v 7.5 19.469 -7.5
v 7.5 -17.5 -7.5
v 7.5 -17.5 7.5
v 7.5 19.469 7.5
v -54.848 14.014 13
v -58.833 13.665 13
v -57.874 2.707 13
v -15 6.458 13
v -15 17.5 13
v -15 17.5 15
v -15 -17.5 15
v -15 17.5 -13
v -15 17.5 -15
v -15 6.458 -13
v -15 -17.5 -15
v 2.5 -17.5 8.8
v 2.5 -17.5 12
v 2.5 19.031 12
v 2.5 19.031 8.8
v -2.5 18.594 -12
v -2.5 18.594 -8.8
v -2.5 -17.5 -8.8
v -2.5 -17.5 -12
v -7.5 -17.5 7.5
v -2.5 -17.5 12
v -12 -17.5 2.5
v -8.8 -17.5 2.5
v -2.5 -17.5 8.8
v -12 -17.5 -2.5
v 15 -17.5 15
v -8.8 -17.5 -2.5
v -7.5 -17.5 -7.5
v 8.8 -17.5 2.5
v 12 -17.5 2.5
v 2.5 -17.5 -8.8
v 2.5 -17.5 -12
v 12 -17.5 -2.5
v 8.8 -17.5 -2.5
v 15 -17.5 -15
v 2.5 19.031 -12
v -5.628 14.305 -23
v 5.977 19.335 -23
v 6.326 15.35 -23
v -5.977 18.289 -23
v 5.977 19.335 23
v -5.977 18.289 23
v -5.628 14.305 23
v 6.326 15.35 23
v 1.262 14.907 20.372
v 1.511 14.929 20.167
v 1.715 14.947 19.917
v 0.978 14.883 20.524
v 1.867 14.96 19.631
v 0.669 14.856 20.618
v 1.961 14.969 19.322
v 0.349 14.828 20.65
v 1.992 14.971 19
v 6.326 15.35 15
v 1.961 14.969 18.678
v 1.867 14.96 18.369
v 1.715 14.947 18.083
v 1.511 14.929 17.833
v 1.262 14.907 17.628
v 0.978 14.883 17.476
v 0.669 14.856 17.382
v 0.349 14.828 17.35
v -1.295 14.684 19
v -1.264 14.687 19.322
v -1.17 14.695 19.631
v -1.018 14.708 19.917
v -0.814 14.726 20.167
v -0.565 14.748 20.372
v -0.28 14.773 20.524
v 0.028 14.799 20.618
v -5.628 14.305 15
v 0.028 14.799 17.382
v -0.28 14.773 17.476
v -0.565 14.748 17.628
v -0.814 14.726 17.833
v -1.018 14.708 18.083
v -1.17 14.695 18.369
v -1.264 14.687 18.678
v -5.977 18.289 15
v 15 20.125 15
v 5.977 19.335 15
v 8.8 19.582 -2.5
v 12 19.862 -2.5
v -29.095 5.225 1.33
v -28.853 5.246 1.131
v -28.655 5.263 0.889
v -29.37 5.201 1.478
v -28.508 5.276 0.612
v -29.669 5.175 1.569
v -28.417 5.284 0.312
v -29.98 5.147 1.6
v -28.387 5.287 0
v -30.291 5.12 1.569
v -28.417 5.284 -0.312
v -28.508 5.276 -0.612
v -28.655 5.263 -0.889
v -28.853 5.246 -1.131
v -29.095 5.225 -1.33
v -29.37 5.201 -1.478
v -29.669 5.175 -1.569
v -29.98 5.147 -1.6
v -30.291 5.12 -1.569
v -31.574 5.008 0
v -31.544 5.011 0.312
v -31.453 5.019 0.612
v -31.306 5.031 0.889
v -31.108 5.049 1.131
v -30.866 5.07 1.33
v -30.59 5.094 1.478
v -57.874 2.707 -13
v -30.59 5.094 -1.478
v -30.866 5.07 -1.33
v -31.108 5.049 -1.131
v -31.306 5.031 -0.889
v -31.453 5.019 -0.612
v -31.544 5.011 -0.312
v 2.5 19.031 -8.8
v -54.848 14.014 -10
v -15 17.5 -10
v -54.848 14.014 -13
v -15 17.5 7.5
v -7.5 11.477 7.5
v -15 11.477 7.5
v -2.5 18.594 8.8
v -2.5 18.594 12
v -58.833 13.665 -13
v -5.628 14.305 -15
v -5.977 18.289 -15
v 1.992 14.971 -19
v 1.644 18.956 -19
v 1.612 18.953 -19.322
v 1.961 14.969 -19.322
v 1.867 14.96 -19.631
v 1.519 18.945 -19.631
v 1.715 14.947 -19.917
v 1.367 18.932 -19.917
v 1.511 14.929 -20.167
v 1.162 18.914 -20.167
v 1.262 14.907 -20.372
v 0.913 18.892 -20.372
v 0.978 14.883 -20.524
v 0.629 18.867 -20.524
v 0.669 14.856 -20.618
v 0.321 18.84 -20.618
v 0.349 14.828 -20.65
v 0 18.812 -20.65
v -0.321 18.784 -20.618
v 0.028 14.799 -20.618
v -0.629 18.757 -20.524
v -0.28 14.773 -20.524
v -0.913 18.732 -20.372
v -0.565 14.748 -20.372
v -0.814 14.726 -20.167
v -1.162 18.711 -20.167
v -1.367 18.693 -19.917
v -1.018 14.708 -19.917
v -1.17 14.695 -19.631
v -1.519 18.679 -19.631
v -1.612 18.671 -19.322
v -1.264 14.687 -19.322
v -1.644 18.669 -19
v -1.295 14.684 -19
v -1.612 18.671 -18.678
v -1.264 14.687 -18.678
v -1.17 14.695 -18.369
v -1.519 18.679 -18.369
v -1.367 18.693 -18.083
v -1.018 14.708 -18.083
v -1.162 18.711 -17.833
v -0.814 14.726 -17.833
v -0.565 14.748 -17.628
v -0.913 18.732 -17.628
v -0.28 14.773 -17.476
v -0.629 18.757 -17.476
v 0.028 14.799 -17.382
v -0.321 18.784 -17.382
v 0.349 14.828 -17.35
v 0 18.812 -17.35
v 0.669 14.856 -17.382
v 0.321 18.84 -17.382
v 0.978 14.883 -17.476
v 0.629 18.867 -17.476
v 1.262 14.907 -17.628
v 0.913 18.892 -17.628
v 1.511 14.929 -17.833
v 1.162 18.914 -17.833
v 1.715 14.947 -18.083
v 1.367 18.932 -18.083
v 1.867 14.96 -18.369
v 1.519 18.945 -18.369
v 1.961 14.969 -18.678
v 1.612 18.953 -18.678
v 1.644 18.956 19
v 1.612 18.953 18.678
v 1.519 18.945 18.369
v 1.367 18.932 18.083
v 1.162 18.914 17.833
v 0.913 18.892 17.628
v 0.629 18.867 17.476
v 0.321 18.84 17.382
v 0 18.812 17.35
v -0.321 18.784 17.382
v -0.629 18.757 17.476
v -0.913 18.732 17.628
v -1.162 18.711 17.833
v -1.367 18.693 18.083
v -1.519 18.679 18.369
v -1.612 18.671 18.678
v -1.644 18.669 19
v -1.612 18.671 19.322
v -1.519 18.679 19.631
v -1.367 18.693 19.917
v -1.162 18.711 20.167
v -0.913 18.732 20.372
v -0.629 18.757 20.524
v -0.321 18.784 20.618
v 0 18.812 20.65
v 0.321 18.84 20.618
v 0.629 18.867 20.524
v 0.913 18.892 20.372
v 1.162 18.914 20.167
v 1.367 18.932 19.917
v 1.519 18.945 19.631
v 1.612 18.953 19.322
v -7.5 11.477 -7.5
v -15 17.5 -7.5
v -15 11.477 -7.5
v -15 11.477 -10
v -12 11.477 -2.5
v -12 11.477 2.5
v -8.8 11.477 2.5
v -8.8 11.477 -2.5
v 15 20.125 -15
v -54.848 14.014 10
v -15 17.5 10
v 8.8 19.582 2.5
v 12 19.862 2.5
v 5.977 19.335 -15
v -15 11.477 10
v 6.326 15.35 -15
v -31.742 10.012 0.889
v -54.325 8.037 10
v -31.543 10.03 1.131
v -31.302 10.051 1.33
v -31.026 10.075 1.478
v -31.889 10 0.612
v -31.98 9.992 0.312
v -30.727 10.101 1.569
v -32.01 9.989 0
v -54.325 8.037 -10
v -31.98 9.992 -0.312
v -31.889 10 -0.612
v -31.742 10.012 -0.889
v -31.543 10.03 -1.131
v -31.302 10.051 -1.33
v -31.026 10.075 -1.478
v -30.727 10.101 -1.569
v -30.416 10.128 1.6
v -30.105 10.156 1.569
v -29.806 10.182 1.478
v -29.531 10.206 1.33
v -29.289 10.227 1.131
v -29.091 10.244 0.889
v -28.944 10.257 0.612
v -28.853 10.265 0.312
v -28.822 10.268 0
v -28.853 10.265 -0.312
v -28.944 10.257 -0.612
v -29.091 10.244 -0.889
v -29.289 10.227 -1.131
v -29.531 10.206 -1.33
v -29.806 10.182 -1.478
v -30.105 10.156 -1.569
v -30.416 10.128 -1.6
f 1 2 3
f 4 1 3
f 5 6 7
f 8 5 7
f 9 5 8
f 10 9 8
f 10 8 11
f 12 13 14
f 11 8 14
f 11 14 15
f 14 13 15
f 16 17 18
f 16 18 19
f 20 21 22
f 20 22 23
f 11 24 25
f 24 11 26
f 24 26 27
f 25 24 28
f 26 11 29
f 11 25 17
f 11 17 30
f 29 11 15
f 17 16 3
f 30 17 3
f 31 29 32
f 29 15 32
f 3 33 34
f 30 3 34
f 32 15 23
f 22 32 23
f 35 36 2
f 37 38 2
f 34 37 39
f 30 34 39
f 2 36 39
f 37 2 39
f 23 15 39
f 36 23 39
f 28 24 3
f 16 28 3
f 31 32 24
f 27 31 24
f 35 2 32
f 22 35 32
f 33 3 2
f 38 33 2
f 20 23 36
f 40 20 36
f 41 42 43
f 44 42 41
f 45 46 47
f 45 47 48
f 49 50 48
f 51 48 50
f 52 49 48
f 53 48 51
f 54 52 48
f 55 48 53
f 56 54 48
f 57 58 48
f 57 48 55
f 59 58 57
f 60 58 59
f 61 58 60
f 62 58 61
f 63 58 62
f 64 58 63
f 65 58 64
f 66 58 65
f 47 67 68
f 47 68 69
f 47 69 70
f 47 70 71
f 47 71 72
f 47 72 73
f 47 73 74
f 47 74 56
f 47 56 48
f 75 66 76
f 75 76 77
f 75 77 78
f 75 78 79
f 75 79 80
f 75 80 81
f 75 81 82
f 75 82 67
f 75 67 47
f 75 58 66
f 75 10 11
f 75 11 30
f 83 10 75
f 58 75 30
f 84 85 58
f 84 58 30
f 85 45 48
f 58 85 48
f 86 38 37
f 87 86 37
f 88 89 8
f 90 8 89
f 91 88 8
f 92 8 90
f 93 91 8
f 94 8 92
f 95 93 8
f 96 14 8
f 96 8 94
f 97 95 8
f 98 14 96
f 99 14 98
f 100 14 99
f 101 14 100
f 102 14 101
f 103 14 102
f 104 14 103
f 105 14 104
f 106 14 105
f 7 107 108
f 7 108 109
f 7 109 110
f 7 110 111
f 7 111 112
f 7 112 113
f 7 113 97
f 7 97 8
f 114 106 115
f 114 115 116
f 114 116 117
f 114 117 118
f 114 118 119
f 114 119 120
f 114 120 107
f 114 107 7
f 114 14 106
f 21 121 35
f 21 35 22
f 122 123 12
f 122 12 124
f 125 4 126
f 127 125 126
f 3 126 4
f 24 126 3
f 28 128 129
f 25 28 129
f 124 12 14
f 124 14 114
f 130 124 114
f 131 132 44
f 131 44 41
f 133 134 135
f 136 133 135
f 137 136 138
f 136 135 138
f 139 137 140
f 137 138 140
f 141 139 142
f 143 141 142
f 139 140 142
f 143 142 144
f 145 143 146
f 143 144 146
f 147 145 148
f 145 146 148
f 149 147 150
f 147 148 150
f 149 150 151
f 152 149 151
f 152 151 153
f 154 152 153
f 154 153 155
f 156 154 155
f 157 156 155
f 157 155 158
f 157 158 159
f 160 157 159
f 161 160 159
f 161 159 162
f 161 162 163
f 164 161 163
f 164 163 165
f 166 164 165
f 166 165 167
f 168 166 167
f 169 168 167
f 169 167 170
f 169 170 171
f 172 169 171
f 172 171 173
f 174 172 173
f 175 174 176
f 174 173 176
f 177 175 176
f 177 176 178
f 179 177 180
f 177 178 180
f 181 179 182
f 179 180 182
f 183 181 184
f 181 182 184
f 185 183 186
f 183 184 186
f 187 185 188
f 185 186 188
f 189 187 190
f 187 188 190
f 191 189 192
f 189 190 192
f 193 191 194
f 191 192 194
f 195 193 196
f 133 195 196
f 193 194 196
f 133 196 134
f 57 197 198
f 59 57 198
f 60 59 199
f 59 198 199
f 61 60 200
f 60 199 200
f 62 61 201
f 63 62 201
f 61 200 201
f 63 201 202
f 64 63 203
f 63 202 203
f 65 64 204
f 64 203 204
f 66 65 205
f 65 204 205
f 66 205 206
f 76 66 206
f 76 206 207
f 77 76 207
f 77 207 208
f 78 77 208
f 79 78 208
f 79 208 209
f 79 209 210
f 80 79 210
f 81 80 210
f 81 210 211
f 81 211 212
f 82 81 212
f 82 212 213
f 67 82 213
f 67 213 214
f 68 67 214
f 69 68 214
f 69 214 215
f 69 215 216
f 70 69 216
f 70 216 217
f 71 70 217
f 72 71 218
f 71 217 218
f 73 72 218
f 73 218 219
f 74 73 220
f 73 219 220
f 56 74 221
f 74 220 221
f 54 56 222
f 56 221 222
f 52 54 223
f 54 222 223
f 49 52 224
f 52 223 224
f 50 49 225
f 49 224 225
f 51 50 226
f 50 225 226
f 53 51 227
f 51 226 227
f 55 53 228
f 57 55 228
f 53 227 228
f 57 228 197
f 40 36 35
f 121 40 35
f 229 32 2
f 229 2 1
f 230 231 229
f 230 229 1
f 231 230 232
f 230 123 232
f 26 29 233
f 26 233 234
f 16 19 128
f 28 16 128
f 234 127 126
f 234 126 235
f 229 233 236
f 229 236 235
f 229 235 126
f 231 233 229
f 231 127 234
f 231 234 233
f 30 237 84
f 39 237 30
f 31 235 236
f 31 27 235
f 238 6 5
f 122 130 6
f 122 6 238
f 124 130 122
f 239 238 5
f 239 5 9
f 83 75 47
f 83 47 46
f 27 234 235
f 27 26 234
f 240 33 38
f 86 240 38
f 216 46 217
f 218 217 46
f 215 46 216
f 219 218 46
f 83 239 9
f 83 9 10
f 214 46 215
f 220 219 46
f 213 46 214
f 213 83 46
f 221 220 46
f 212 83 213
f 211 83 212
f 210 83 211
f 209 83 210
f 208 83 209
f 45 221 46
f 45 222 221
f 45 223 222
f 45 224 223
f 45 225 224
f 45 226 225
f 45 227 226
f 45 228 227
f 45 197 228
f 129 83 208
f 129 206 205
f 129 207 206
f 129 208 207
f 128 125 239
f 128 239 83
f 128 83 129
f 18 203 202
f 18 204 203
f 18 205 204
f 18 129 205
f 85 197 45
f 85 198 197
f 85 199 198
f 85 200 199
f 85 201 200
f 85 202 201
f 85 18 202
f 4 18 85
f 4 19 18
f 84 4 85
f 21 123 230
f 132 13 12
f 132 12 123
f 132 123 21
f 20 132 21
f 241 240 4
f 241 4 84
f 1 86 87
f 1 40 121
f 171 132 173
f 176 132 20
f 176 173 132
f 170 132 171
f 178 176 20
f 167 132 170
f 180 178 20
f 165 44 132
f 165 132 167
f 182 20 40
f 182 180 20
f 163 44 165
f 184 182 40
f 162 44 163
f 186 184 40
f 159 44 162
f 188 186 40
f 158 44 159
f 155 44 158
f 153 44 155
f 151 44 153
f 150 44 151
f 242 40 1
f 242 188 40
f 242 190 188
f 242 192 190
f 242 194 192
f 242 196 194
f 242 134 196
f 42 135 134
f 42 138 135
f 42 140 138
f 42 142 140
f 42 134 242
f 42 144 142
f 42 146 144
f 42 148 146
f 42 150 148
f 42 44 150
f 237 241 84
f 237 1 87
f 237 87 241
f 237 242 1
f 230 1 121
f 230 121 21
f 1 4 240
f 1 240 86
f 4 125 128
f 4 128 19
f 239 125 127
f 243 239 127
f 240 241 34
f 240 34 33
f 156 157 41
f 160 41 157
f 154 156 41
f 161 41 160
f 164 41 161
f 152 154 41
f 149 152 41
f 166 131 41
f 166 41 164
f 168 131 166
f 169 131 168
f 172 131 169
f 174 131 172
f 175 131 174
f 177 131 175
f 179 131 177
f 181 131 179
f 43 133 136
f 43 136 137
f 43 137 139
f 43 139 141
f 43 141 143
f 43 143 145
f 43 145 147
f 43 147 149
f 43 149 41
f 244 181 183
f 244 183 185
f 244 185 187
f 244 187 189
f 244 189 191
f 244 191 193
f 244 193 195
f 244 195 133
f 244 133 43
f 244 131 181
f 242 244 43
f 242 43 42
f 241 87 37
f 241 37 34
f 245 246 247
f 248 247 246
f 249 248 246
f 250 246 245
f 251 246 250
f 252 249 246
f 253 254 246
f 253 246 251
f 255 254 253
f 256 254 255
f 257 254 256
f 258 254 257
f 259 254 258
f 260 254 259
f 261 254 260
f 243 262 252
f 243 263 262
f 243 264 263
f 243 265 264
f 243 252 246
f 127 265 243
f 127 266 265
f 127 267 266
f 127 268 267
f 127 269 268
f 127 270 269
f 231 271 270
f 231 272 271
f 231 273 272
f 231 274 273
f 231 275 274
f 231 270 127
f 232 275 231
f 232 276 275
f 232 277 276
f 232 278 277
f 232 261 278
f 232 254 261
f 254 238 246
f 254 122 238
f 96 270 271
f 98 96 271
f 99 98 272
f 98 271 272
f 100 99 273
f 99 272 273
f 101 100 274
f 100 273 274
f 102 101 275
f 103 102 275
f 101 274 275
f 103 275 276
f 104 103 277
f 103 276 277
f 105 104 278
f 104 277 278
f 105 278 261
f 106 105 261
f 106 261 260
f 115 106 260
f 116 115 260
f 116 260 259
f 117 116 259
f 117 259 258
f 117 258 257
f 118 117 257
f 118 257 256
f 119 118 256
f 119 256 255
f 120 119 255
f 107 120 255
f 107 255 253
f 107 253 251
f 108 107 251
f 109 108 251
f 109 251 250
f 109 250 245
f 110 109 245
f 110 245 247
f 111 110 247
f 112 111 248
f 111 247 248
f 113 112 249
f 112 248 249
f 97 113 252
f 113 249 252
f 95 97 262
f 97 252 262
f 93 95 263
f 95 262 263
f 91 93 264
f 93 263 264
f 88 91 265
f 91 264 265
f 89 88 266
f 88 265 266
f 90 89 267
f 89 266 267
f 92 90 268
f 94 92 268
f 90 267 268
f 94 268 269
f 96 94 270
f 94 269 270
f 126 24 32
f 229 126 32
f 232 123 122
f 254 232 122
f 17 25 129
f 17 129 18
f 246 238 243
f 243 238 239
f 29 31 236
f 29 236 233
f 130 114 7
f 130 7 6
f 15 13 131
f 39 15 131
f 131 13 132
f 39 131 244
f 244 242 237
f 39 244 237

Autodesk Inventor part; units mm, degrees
ref_plane "YZ Plane" through (0, 0, 0) normal (1, 0, 0) x (0, 1, 0)
ref_plane "XZ Plane" through (0, 0, 0) normal (0, 1, 0) x (-1, 0, 0)
ref_plane "XY Plane" through (0, 0, 0) normal (0, 0, 1) x (1, 0, 0)
sketch "Sketch1" plane through (0, 0, 0) normal (0, 0, 1) x (1, 0, 0)
  line L0 (-15, -17.5) -> (15, -17.5)
  line L1 (15, -17.5) -> (15, 17.5)
  line L2 (15, 17.5) -> (-15, 17.5)
  line L3 (-15, 17.5) -> (-15, -17.5)
  line L4 (-15, -17.5) -> (15, 17.5) construction
  line L5 (15, -17.5) -> (-15, 17.5) construction
  line L6 (-15, 17.5) -> (15, 20.1247)
  line L7 (15, 20.1247) -> (15, 17.5)
  point P0 (0, 0)
  dimension "d0" = 5
  dimension "d1" = 30
  dimension "d3" = 35
extrude "Extrusion1" add sketch "Sketch1" along normal mid plane 30
sketch "Sketch2" plane through (-15, -17.5, -15) normal (0, -1, 0) x (1, 0, 0)
  line L0 (7.5, 7.5) -> (22.5, 7.5)
  line L1 (22.5, 7.5) -> (22.5, 22.5)
  line L2 (22.5, 22.5) -> (7.5, 22.5)
  line L3 (7.5, 22.5) -> (7.5, 7.5)
  line L4 (7.5, 7.5) -> (22.5, 22.5) construction
  line L5 (22.5, 7.5) -> (7.5, 22.5) construction
  line L6 (0, 30) -> (0, 0) projected
  line L7 (30, 0) -> (0, 0) projected
  line L8 (12.5, 3) -> (17.5, 3)
  line L9 (17.5, 3) -> (17.5, 6.2)
  line L10 (17.5, 6.2) -> (12.5, 6.2)
  line L11 (12.5, 6.2) -> (12.5, 3)
  line L12 (12.5, 3) -> (17.5, 6.2) construction
  line L13 (17.5, 3) -> (12.5, 6.2) construction
  line L14 (3, 17.5) -> (6.2, 17.5)
  line L15 (6.2, 17.5) -> (6.2, 12.5)
  line L16 (6.2, 12.5) -> (3, 12.5)
  line L17 (3, 12.5) -> (3, 17.5)
  line L18 (3, 17.5) -> (6.2, 12.5) construction
  line L19 (6.2, 17.5) -> (3, 12.5) construction
  line L20 (15, 7.5) -> (15, 22.5)
  line L21 (7.5, 15) -> (22.5, 15)
  line L22 (12.5, 27) -> (17.5, 27)
  line L23 (17.5, 27) -> (17.5, 23.8)
  line L24 (17.5, 23.8) -> (12.5, 23.8)
  line L25 (12.5, 23.8) -> (12.5, 27)
  line L26 (12.5, 27) -> (17.5, 23.8) construction
  line L27 (17.5, 27) -> (12.5, 23.8) construction
  line L28 (27, 17.5) -> (23.8, 17.5)
  line L29 (23.8, 17.5) -> (23.8, 12.5)
  line L30 (23.8, 12.5) -> (27, 12.5)
  line L31 (27, 12.5) -> (27, 17.5)
  line L32 (27, 17.5) -> (23.8, 12.5) construction
  line L33 (23.8, 17.5) -> (27, 12.5) construction
  point P0 (15, 15)
  point P1 (15, 15)
  point P2 (0, 15)
  point P3 (15, 0)
  point P4 (15, 4.6)
  point P5 (4.6, 15)
  point P6 (0, 15)
  point P7 (3, 15)
  point P8 (15, 0)
  point P9 (15, 25.4)
  point P10 (25.4, 15)
  point P11 (27, 15)
  dimension "d6" = 15
  dimension "d7" = 5
  dimension "d8" = 3.2
  dimension "d9" = 3
  dimension "d10" = 3
extrude "Extrusion2" cut sketch "Sketch2" against normal through all
sketch "Sketch3" plane through (0, 0, 0) normal (0, 0, 1) x (1, 0, 0)
  line L0 (-15, -17.5) -> (-15, 17.5) projected
  line L1 (-15, 6.458) -> (-57.8739, 2.707)
  line L2 (-57.8739, 2.707) -> (-58.8326, 13.6651)
  line L3 (-58.8326, 13.6651) -> (-54.8478, 14.0138)
  line L4 (-54.8478, 14.0138) -> (-54.3249, 8.0366)
  line L5 (-54.3249, 8.0366) -> (-15, 11.4771)
  line L6 (15, 20.1247) -> (-15, 17.5) projected
  line L7 (-54.8478, 14.0138) -> (-15, 17.5)
  point P0 (0, 0)
  dimension "d14" = 4
  dimension "d15" = 5
  dimension "d16" = 6
  dimension "d17" = 40
extrude "Extrusion3" add sketch "Sketch3" along normal mid plane 20 contours L1 L2 L3 L4 L5 L0
sketch "Sketch4" plane through (-54.3249, 8.0366, 10) normal (-0.0872, 0.9962, 0) x (0.9962, 0.0872, 0)
  circle A0 centre (24, 10) radius 1.6
  line L0 (39.4751, 20) -> (39.4751, 0) projected
  line L1 (0, 0) -> (0, 20) projected
  point P0 (53.4177, 10)
  point P1 (39.4751, 10)
  dimension "d20" = 3.2
  dimension "d21" = 24
extrude "Extrusion4" cut sketch "Sketch4" against normal blind 20
sketch "Sketch5" plane through (-15, -17.5, 15) normal (-1, 0, 0) x (0, 0, 1)
  line L0 (-22.5, 36.9771) -> (-7.5, 36.9771)
  line L1 (-7.5, 36.9771) -> (-7.5, 28.9771)
  line L2 (-7.5, 28.9771) -> (-22.5, 28.9771)
  line L3 (-22.5, 28.9771) -> (-22.5, 36.9771)
  line L4 (-22.5, 36.9771) -> (-7.5, 28.9771) construction
  line L5 (-7.5, 36.9771) -> (-22.5, 28.9771) construction
  line L6 (-30, 35) -> (0, 35) projected
  line L7 (-25, 28.9771) -> (-5, 28.9771) projected
  point P0 (-15, 17.5)
  point P1 (-15, 32.9771)
  point P2 (-15, 35)
  point P3 (-15, 28.9771)
  dimension "d24" = 15
  dimension "d25" = 8
extrude "Extrusion5" cut sketch "Sketch5" against normal up to surface (22.5 mm away)
sketch "Sketch7" plane through (0, 0, 15) normal (0, 0, 1) x (1, 0, 0)
  line L0 (15, 20.1247) -> (-15, 17.5) projected
  line L1 (-5.9772, 18.2894) -> (5.9772, 19.3353)
  line L2 (5.9772, 19.3353) -> (6.3258, 15.3505)
  line L3 (6.3258, 15.3505) -> (-5.6285, 14.3046)
  line L4 (-5.6285, 14.3046) -> (-5.9772, 18.2894)
  line L5 (-5.9772, 18.2894) -> (6.3258, 15.3505) construction
  line L6 (5.9772, 19.3353) -> (-5.6285, 14.3046) construction
  point P0 (0, 0)
  point P1 (0, 18.8123)
  point P2 (0.1743, 16.8199)
  point P3 (0, 18.8123)
  point P4 (-5.9772, 18.2894)
  dimension "d30" = 12
  dimension "d31" = 4
extrude "Extrusion6" add sketch "Sketch7" along normal blind 8
sketch "Sketch8" plane through (15, 20.1247, 15) normal (-0.0872, 0.9962, 0) x (0.9962, 0.0872, 0)
  circle A0 centre (-15.0573, -4) radius 1.65
  line L0 (-9.0573, 0) -> (-9.0573, -8) projected
  line L1 (-9.0573, -8) -> (-21.0573, -8) projected
  line L2 (-9.0573, 0) -> (-21.0573, 0) projected
  point P0 (-16.6969, 15)
  point P1 (-9.0573, -4)
  point P2 (-15.0573, -8)
  point P3 (-15.0573, 0)
  dimension "d34" = 3.3
  dimension "d37" = 4
extrude "Extrusion7" cut sketch "Sketch8" against normal blind 12
mirror "Mirror1" about plane through (0, 0, 0) normal (0, 0, 1) of "Extrusion6", "Extrusion7"
extrude "Extrusion8" add sketch "Sketch3" along normal blind 3 from surface at 10
mirror "Mirror2" about plane through (0, 0, 0) normal (0, 0, 1) of "Extrusion8"
equation "\"d10\" = d9"
properties part number "Upper Path Fixation"
